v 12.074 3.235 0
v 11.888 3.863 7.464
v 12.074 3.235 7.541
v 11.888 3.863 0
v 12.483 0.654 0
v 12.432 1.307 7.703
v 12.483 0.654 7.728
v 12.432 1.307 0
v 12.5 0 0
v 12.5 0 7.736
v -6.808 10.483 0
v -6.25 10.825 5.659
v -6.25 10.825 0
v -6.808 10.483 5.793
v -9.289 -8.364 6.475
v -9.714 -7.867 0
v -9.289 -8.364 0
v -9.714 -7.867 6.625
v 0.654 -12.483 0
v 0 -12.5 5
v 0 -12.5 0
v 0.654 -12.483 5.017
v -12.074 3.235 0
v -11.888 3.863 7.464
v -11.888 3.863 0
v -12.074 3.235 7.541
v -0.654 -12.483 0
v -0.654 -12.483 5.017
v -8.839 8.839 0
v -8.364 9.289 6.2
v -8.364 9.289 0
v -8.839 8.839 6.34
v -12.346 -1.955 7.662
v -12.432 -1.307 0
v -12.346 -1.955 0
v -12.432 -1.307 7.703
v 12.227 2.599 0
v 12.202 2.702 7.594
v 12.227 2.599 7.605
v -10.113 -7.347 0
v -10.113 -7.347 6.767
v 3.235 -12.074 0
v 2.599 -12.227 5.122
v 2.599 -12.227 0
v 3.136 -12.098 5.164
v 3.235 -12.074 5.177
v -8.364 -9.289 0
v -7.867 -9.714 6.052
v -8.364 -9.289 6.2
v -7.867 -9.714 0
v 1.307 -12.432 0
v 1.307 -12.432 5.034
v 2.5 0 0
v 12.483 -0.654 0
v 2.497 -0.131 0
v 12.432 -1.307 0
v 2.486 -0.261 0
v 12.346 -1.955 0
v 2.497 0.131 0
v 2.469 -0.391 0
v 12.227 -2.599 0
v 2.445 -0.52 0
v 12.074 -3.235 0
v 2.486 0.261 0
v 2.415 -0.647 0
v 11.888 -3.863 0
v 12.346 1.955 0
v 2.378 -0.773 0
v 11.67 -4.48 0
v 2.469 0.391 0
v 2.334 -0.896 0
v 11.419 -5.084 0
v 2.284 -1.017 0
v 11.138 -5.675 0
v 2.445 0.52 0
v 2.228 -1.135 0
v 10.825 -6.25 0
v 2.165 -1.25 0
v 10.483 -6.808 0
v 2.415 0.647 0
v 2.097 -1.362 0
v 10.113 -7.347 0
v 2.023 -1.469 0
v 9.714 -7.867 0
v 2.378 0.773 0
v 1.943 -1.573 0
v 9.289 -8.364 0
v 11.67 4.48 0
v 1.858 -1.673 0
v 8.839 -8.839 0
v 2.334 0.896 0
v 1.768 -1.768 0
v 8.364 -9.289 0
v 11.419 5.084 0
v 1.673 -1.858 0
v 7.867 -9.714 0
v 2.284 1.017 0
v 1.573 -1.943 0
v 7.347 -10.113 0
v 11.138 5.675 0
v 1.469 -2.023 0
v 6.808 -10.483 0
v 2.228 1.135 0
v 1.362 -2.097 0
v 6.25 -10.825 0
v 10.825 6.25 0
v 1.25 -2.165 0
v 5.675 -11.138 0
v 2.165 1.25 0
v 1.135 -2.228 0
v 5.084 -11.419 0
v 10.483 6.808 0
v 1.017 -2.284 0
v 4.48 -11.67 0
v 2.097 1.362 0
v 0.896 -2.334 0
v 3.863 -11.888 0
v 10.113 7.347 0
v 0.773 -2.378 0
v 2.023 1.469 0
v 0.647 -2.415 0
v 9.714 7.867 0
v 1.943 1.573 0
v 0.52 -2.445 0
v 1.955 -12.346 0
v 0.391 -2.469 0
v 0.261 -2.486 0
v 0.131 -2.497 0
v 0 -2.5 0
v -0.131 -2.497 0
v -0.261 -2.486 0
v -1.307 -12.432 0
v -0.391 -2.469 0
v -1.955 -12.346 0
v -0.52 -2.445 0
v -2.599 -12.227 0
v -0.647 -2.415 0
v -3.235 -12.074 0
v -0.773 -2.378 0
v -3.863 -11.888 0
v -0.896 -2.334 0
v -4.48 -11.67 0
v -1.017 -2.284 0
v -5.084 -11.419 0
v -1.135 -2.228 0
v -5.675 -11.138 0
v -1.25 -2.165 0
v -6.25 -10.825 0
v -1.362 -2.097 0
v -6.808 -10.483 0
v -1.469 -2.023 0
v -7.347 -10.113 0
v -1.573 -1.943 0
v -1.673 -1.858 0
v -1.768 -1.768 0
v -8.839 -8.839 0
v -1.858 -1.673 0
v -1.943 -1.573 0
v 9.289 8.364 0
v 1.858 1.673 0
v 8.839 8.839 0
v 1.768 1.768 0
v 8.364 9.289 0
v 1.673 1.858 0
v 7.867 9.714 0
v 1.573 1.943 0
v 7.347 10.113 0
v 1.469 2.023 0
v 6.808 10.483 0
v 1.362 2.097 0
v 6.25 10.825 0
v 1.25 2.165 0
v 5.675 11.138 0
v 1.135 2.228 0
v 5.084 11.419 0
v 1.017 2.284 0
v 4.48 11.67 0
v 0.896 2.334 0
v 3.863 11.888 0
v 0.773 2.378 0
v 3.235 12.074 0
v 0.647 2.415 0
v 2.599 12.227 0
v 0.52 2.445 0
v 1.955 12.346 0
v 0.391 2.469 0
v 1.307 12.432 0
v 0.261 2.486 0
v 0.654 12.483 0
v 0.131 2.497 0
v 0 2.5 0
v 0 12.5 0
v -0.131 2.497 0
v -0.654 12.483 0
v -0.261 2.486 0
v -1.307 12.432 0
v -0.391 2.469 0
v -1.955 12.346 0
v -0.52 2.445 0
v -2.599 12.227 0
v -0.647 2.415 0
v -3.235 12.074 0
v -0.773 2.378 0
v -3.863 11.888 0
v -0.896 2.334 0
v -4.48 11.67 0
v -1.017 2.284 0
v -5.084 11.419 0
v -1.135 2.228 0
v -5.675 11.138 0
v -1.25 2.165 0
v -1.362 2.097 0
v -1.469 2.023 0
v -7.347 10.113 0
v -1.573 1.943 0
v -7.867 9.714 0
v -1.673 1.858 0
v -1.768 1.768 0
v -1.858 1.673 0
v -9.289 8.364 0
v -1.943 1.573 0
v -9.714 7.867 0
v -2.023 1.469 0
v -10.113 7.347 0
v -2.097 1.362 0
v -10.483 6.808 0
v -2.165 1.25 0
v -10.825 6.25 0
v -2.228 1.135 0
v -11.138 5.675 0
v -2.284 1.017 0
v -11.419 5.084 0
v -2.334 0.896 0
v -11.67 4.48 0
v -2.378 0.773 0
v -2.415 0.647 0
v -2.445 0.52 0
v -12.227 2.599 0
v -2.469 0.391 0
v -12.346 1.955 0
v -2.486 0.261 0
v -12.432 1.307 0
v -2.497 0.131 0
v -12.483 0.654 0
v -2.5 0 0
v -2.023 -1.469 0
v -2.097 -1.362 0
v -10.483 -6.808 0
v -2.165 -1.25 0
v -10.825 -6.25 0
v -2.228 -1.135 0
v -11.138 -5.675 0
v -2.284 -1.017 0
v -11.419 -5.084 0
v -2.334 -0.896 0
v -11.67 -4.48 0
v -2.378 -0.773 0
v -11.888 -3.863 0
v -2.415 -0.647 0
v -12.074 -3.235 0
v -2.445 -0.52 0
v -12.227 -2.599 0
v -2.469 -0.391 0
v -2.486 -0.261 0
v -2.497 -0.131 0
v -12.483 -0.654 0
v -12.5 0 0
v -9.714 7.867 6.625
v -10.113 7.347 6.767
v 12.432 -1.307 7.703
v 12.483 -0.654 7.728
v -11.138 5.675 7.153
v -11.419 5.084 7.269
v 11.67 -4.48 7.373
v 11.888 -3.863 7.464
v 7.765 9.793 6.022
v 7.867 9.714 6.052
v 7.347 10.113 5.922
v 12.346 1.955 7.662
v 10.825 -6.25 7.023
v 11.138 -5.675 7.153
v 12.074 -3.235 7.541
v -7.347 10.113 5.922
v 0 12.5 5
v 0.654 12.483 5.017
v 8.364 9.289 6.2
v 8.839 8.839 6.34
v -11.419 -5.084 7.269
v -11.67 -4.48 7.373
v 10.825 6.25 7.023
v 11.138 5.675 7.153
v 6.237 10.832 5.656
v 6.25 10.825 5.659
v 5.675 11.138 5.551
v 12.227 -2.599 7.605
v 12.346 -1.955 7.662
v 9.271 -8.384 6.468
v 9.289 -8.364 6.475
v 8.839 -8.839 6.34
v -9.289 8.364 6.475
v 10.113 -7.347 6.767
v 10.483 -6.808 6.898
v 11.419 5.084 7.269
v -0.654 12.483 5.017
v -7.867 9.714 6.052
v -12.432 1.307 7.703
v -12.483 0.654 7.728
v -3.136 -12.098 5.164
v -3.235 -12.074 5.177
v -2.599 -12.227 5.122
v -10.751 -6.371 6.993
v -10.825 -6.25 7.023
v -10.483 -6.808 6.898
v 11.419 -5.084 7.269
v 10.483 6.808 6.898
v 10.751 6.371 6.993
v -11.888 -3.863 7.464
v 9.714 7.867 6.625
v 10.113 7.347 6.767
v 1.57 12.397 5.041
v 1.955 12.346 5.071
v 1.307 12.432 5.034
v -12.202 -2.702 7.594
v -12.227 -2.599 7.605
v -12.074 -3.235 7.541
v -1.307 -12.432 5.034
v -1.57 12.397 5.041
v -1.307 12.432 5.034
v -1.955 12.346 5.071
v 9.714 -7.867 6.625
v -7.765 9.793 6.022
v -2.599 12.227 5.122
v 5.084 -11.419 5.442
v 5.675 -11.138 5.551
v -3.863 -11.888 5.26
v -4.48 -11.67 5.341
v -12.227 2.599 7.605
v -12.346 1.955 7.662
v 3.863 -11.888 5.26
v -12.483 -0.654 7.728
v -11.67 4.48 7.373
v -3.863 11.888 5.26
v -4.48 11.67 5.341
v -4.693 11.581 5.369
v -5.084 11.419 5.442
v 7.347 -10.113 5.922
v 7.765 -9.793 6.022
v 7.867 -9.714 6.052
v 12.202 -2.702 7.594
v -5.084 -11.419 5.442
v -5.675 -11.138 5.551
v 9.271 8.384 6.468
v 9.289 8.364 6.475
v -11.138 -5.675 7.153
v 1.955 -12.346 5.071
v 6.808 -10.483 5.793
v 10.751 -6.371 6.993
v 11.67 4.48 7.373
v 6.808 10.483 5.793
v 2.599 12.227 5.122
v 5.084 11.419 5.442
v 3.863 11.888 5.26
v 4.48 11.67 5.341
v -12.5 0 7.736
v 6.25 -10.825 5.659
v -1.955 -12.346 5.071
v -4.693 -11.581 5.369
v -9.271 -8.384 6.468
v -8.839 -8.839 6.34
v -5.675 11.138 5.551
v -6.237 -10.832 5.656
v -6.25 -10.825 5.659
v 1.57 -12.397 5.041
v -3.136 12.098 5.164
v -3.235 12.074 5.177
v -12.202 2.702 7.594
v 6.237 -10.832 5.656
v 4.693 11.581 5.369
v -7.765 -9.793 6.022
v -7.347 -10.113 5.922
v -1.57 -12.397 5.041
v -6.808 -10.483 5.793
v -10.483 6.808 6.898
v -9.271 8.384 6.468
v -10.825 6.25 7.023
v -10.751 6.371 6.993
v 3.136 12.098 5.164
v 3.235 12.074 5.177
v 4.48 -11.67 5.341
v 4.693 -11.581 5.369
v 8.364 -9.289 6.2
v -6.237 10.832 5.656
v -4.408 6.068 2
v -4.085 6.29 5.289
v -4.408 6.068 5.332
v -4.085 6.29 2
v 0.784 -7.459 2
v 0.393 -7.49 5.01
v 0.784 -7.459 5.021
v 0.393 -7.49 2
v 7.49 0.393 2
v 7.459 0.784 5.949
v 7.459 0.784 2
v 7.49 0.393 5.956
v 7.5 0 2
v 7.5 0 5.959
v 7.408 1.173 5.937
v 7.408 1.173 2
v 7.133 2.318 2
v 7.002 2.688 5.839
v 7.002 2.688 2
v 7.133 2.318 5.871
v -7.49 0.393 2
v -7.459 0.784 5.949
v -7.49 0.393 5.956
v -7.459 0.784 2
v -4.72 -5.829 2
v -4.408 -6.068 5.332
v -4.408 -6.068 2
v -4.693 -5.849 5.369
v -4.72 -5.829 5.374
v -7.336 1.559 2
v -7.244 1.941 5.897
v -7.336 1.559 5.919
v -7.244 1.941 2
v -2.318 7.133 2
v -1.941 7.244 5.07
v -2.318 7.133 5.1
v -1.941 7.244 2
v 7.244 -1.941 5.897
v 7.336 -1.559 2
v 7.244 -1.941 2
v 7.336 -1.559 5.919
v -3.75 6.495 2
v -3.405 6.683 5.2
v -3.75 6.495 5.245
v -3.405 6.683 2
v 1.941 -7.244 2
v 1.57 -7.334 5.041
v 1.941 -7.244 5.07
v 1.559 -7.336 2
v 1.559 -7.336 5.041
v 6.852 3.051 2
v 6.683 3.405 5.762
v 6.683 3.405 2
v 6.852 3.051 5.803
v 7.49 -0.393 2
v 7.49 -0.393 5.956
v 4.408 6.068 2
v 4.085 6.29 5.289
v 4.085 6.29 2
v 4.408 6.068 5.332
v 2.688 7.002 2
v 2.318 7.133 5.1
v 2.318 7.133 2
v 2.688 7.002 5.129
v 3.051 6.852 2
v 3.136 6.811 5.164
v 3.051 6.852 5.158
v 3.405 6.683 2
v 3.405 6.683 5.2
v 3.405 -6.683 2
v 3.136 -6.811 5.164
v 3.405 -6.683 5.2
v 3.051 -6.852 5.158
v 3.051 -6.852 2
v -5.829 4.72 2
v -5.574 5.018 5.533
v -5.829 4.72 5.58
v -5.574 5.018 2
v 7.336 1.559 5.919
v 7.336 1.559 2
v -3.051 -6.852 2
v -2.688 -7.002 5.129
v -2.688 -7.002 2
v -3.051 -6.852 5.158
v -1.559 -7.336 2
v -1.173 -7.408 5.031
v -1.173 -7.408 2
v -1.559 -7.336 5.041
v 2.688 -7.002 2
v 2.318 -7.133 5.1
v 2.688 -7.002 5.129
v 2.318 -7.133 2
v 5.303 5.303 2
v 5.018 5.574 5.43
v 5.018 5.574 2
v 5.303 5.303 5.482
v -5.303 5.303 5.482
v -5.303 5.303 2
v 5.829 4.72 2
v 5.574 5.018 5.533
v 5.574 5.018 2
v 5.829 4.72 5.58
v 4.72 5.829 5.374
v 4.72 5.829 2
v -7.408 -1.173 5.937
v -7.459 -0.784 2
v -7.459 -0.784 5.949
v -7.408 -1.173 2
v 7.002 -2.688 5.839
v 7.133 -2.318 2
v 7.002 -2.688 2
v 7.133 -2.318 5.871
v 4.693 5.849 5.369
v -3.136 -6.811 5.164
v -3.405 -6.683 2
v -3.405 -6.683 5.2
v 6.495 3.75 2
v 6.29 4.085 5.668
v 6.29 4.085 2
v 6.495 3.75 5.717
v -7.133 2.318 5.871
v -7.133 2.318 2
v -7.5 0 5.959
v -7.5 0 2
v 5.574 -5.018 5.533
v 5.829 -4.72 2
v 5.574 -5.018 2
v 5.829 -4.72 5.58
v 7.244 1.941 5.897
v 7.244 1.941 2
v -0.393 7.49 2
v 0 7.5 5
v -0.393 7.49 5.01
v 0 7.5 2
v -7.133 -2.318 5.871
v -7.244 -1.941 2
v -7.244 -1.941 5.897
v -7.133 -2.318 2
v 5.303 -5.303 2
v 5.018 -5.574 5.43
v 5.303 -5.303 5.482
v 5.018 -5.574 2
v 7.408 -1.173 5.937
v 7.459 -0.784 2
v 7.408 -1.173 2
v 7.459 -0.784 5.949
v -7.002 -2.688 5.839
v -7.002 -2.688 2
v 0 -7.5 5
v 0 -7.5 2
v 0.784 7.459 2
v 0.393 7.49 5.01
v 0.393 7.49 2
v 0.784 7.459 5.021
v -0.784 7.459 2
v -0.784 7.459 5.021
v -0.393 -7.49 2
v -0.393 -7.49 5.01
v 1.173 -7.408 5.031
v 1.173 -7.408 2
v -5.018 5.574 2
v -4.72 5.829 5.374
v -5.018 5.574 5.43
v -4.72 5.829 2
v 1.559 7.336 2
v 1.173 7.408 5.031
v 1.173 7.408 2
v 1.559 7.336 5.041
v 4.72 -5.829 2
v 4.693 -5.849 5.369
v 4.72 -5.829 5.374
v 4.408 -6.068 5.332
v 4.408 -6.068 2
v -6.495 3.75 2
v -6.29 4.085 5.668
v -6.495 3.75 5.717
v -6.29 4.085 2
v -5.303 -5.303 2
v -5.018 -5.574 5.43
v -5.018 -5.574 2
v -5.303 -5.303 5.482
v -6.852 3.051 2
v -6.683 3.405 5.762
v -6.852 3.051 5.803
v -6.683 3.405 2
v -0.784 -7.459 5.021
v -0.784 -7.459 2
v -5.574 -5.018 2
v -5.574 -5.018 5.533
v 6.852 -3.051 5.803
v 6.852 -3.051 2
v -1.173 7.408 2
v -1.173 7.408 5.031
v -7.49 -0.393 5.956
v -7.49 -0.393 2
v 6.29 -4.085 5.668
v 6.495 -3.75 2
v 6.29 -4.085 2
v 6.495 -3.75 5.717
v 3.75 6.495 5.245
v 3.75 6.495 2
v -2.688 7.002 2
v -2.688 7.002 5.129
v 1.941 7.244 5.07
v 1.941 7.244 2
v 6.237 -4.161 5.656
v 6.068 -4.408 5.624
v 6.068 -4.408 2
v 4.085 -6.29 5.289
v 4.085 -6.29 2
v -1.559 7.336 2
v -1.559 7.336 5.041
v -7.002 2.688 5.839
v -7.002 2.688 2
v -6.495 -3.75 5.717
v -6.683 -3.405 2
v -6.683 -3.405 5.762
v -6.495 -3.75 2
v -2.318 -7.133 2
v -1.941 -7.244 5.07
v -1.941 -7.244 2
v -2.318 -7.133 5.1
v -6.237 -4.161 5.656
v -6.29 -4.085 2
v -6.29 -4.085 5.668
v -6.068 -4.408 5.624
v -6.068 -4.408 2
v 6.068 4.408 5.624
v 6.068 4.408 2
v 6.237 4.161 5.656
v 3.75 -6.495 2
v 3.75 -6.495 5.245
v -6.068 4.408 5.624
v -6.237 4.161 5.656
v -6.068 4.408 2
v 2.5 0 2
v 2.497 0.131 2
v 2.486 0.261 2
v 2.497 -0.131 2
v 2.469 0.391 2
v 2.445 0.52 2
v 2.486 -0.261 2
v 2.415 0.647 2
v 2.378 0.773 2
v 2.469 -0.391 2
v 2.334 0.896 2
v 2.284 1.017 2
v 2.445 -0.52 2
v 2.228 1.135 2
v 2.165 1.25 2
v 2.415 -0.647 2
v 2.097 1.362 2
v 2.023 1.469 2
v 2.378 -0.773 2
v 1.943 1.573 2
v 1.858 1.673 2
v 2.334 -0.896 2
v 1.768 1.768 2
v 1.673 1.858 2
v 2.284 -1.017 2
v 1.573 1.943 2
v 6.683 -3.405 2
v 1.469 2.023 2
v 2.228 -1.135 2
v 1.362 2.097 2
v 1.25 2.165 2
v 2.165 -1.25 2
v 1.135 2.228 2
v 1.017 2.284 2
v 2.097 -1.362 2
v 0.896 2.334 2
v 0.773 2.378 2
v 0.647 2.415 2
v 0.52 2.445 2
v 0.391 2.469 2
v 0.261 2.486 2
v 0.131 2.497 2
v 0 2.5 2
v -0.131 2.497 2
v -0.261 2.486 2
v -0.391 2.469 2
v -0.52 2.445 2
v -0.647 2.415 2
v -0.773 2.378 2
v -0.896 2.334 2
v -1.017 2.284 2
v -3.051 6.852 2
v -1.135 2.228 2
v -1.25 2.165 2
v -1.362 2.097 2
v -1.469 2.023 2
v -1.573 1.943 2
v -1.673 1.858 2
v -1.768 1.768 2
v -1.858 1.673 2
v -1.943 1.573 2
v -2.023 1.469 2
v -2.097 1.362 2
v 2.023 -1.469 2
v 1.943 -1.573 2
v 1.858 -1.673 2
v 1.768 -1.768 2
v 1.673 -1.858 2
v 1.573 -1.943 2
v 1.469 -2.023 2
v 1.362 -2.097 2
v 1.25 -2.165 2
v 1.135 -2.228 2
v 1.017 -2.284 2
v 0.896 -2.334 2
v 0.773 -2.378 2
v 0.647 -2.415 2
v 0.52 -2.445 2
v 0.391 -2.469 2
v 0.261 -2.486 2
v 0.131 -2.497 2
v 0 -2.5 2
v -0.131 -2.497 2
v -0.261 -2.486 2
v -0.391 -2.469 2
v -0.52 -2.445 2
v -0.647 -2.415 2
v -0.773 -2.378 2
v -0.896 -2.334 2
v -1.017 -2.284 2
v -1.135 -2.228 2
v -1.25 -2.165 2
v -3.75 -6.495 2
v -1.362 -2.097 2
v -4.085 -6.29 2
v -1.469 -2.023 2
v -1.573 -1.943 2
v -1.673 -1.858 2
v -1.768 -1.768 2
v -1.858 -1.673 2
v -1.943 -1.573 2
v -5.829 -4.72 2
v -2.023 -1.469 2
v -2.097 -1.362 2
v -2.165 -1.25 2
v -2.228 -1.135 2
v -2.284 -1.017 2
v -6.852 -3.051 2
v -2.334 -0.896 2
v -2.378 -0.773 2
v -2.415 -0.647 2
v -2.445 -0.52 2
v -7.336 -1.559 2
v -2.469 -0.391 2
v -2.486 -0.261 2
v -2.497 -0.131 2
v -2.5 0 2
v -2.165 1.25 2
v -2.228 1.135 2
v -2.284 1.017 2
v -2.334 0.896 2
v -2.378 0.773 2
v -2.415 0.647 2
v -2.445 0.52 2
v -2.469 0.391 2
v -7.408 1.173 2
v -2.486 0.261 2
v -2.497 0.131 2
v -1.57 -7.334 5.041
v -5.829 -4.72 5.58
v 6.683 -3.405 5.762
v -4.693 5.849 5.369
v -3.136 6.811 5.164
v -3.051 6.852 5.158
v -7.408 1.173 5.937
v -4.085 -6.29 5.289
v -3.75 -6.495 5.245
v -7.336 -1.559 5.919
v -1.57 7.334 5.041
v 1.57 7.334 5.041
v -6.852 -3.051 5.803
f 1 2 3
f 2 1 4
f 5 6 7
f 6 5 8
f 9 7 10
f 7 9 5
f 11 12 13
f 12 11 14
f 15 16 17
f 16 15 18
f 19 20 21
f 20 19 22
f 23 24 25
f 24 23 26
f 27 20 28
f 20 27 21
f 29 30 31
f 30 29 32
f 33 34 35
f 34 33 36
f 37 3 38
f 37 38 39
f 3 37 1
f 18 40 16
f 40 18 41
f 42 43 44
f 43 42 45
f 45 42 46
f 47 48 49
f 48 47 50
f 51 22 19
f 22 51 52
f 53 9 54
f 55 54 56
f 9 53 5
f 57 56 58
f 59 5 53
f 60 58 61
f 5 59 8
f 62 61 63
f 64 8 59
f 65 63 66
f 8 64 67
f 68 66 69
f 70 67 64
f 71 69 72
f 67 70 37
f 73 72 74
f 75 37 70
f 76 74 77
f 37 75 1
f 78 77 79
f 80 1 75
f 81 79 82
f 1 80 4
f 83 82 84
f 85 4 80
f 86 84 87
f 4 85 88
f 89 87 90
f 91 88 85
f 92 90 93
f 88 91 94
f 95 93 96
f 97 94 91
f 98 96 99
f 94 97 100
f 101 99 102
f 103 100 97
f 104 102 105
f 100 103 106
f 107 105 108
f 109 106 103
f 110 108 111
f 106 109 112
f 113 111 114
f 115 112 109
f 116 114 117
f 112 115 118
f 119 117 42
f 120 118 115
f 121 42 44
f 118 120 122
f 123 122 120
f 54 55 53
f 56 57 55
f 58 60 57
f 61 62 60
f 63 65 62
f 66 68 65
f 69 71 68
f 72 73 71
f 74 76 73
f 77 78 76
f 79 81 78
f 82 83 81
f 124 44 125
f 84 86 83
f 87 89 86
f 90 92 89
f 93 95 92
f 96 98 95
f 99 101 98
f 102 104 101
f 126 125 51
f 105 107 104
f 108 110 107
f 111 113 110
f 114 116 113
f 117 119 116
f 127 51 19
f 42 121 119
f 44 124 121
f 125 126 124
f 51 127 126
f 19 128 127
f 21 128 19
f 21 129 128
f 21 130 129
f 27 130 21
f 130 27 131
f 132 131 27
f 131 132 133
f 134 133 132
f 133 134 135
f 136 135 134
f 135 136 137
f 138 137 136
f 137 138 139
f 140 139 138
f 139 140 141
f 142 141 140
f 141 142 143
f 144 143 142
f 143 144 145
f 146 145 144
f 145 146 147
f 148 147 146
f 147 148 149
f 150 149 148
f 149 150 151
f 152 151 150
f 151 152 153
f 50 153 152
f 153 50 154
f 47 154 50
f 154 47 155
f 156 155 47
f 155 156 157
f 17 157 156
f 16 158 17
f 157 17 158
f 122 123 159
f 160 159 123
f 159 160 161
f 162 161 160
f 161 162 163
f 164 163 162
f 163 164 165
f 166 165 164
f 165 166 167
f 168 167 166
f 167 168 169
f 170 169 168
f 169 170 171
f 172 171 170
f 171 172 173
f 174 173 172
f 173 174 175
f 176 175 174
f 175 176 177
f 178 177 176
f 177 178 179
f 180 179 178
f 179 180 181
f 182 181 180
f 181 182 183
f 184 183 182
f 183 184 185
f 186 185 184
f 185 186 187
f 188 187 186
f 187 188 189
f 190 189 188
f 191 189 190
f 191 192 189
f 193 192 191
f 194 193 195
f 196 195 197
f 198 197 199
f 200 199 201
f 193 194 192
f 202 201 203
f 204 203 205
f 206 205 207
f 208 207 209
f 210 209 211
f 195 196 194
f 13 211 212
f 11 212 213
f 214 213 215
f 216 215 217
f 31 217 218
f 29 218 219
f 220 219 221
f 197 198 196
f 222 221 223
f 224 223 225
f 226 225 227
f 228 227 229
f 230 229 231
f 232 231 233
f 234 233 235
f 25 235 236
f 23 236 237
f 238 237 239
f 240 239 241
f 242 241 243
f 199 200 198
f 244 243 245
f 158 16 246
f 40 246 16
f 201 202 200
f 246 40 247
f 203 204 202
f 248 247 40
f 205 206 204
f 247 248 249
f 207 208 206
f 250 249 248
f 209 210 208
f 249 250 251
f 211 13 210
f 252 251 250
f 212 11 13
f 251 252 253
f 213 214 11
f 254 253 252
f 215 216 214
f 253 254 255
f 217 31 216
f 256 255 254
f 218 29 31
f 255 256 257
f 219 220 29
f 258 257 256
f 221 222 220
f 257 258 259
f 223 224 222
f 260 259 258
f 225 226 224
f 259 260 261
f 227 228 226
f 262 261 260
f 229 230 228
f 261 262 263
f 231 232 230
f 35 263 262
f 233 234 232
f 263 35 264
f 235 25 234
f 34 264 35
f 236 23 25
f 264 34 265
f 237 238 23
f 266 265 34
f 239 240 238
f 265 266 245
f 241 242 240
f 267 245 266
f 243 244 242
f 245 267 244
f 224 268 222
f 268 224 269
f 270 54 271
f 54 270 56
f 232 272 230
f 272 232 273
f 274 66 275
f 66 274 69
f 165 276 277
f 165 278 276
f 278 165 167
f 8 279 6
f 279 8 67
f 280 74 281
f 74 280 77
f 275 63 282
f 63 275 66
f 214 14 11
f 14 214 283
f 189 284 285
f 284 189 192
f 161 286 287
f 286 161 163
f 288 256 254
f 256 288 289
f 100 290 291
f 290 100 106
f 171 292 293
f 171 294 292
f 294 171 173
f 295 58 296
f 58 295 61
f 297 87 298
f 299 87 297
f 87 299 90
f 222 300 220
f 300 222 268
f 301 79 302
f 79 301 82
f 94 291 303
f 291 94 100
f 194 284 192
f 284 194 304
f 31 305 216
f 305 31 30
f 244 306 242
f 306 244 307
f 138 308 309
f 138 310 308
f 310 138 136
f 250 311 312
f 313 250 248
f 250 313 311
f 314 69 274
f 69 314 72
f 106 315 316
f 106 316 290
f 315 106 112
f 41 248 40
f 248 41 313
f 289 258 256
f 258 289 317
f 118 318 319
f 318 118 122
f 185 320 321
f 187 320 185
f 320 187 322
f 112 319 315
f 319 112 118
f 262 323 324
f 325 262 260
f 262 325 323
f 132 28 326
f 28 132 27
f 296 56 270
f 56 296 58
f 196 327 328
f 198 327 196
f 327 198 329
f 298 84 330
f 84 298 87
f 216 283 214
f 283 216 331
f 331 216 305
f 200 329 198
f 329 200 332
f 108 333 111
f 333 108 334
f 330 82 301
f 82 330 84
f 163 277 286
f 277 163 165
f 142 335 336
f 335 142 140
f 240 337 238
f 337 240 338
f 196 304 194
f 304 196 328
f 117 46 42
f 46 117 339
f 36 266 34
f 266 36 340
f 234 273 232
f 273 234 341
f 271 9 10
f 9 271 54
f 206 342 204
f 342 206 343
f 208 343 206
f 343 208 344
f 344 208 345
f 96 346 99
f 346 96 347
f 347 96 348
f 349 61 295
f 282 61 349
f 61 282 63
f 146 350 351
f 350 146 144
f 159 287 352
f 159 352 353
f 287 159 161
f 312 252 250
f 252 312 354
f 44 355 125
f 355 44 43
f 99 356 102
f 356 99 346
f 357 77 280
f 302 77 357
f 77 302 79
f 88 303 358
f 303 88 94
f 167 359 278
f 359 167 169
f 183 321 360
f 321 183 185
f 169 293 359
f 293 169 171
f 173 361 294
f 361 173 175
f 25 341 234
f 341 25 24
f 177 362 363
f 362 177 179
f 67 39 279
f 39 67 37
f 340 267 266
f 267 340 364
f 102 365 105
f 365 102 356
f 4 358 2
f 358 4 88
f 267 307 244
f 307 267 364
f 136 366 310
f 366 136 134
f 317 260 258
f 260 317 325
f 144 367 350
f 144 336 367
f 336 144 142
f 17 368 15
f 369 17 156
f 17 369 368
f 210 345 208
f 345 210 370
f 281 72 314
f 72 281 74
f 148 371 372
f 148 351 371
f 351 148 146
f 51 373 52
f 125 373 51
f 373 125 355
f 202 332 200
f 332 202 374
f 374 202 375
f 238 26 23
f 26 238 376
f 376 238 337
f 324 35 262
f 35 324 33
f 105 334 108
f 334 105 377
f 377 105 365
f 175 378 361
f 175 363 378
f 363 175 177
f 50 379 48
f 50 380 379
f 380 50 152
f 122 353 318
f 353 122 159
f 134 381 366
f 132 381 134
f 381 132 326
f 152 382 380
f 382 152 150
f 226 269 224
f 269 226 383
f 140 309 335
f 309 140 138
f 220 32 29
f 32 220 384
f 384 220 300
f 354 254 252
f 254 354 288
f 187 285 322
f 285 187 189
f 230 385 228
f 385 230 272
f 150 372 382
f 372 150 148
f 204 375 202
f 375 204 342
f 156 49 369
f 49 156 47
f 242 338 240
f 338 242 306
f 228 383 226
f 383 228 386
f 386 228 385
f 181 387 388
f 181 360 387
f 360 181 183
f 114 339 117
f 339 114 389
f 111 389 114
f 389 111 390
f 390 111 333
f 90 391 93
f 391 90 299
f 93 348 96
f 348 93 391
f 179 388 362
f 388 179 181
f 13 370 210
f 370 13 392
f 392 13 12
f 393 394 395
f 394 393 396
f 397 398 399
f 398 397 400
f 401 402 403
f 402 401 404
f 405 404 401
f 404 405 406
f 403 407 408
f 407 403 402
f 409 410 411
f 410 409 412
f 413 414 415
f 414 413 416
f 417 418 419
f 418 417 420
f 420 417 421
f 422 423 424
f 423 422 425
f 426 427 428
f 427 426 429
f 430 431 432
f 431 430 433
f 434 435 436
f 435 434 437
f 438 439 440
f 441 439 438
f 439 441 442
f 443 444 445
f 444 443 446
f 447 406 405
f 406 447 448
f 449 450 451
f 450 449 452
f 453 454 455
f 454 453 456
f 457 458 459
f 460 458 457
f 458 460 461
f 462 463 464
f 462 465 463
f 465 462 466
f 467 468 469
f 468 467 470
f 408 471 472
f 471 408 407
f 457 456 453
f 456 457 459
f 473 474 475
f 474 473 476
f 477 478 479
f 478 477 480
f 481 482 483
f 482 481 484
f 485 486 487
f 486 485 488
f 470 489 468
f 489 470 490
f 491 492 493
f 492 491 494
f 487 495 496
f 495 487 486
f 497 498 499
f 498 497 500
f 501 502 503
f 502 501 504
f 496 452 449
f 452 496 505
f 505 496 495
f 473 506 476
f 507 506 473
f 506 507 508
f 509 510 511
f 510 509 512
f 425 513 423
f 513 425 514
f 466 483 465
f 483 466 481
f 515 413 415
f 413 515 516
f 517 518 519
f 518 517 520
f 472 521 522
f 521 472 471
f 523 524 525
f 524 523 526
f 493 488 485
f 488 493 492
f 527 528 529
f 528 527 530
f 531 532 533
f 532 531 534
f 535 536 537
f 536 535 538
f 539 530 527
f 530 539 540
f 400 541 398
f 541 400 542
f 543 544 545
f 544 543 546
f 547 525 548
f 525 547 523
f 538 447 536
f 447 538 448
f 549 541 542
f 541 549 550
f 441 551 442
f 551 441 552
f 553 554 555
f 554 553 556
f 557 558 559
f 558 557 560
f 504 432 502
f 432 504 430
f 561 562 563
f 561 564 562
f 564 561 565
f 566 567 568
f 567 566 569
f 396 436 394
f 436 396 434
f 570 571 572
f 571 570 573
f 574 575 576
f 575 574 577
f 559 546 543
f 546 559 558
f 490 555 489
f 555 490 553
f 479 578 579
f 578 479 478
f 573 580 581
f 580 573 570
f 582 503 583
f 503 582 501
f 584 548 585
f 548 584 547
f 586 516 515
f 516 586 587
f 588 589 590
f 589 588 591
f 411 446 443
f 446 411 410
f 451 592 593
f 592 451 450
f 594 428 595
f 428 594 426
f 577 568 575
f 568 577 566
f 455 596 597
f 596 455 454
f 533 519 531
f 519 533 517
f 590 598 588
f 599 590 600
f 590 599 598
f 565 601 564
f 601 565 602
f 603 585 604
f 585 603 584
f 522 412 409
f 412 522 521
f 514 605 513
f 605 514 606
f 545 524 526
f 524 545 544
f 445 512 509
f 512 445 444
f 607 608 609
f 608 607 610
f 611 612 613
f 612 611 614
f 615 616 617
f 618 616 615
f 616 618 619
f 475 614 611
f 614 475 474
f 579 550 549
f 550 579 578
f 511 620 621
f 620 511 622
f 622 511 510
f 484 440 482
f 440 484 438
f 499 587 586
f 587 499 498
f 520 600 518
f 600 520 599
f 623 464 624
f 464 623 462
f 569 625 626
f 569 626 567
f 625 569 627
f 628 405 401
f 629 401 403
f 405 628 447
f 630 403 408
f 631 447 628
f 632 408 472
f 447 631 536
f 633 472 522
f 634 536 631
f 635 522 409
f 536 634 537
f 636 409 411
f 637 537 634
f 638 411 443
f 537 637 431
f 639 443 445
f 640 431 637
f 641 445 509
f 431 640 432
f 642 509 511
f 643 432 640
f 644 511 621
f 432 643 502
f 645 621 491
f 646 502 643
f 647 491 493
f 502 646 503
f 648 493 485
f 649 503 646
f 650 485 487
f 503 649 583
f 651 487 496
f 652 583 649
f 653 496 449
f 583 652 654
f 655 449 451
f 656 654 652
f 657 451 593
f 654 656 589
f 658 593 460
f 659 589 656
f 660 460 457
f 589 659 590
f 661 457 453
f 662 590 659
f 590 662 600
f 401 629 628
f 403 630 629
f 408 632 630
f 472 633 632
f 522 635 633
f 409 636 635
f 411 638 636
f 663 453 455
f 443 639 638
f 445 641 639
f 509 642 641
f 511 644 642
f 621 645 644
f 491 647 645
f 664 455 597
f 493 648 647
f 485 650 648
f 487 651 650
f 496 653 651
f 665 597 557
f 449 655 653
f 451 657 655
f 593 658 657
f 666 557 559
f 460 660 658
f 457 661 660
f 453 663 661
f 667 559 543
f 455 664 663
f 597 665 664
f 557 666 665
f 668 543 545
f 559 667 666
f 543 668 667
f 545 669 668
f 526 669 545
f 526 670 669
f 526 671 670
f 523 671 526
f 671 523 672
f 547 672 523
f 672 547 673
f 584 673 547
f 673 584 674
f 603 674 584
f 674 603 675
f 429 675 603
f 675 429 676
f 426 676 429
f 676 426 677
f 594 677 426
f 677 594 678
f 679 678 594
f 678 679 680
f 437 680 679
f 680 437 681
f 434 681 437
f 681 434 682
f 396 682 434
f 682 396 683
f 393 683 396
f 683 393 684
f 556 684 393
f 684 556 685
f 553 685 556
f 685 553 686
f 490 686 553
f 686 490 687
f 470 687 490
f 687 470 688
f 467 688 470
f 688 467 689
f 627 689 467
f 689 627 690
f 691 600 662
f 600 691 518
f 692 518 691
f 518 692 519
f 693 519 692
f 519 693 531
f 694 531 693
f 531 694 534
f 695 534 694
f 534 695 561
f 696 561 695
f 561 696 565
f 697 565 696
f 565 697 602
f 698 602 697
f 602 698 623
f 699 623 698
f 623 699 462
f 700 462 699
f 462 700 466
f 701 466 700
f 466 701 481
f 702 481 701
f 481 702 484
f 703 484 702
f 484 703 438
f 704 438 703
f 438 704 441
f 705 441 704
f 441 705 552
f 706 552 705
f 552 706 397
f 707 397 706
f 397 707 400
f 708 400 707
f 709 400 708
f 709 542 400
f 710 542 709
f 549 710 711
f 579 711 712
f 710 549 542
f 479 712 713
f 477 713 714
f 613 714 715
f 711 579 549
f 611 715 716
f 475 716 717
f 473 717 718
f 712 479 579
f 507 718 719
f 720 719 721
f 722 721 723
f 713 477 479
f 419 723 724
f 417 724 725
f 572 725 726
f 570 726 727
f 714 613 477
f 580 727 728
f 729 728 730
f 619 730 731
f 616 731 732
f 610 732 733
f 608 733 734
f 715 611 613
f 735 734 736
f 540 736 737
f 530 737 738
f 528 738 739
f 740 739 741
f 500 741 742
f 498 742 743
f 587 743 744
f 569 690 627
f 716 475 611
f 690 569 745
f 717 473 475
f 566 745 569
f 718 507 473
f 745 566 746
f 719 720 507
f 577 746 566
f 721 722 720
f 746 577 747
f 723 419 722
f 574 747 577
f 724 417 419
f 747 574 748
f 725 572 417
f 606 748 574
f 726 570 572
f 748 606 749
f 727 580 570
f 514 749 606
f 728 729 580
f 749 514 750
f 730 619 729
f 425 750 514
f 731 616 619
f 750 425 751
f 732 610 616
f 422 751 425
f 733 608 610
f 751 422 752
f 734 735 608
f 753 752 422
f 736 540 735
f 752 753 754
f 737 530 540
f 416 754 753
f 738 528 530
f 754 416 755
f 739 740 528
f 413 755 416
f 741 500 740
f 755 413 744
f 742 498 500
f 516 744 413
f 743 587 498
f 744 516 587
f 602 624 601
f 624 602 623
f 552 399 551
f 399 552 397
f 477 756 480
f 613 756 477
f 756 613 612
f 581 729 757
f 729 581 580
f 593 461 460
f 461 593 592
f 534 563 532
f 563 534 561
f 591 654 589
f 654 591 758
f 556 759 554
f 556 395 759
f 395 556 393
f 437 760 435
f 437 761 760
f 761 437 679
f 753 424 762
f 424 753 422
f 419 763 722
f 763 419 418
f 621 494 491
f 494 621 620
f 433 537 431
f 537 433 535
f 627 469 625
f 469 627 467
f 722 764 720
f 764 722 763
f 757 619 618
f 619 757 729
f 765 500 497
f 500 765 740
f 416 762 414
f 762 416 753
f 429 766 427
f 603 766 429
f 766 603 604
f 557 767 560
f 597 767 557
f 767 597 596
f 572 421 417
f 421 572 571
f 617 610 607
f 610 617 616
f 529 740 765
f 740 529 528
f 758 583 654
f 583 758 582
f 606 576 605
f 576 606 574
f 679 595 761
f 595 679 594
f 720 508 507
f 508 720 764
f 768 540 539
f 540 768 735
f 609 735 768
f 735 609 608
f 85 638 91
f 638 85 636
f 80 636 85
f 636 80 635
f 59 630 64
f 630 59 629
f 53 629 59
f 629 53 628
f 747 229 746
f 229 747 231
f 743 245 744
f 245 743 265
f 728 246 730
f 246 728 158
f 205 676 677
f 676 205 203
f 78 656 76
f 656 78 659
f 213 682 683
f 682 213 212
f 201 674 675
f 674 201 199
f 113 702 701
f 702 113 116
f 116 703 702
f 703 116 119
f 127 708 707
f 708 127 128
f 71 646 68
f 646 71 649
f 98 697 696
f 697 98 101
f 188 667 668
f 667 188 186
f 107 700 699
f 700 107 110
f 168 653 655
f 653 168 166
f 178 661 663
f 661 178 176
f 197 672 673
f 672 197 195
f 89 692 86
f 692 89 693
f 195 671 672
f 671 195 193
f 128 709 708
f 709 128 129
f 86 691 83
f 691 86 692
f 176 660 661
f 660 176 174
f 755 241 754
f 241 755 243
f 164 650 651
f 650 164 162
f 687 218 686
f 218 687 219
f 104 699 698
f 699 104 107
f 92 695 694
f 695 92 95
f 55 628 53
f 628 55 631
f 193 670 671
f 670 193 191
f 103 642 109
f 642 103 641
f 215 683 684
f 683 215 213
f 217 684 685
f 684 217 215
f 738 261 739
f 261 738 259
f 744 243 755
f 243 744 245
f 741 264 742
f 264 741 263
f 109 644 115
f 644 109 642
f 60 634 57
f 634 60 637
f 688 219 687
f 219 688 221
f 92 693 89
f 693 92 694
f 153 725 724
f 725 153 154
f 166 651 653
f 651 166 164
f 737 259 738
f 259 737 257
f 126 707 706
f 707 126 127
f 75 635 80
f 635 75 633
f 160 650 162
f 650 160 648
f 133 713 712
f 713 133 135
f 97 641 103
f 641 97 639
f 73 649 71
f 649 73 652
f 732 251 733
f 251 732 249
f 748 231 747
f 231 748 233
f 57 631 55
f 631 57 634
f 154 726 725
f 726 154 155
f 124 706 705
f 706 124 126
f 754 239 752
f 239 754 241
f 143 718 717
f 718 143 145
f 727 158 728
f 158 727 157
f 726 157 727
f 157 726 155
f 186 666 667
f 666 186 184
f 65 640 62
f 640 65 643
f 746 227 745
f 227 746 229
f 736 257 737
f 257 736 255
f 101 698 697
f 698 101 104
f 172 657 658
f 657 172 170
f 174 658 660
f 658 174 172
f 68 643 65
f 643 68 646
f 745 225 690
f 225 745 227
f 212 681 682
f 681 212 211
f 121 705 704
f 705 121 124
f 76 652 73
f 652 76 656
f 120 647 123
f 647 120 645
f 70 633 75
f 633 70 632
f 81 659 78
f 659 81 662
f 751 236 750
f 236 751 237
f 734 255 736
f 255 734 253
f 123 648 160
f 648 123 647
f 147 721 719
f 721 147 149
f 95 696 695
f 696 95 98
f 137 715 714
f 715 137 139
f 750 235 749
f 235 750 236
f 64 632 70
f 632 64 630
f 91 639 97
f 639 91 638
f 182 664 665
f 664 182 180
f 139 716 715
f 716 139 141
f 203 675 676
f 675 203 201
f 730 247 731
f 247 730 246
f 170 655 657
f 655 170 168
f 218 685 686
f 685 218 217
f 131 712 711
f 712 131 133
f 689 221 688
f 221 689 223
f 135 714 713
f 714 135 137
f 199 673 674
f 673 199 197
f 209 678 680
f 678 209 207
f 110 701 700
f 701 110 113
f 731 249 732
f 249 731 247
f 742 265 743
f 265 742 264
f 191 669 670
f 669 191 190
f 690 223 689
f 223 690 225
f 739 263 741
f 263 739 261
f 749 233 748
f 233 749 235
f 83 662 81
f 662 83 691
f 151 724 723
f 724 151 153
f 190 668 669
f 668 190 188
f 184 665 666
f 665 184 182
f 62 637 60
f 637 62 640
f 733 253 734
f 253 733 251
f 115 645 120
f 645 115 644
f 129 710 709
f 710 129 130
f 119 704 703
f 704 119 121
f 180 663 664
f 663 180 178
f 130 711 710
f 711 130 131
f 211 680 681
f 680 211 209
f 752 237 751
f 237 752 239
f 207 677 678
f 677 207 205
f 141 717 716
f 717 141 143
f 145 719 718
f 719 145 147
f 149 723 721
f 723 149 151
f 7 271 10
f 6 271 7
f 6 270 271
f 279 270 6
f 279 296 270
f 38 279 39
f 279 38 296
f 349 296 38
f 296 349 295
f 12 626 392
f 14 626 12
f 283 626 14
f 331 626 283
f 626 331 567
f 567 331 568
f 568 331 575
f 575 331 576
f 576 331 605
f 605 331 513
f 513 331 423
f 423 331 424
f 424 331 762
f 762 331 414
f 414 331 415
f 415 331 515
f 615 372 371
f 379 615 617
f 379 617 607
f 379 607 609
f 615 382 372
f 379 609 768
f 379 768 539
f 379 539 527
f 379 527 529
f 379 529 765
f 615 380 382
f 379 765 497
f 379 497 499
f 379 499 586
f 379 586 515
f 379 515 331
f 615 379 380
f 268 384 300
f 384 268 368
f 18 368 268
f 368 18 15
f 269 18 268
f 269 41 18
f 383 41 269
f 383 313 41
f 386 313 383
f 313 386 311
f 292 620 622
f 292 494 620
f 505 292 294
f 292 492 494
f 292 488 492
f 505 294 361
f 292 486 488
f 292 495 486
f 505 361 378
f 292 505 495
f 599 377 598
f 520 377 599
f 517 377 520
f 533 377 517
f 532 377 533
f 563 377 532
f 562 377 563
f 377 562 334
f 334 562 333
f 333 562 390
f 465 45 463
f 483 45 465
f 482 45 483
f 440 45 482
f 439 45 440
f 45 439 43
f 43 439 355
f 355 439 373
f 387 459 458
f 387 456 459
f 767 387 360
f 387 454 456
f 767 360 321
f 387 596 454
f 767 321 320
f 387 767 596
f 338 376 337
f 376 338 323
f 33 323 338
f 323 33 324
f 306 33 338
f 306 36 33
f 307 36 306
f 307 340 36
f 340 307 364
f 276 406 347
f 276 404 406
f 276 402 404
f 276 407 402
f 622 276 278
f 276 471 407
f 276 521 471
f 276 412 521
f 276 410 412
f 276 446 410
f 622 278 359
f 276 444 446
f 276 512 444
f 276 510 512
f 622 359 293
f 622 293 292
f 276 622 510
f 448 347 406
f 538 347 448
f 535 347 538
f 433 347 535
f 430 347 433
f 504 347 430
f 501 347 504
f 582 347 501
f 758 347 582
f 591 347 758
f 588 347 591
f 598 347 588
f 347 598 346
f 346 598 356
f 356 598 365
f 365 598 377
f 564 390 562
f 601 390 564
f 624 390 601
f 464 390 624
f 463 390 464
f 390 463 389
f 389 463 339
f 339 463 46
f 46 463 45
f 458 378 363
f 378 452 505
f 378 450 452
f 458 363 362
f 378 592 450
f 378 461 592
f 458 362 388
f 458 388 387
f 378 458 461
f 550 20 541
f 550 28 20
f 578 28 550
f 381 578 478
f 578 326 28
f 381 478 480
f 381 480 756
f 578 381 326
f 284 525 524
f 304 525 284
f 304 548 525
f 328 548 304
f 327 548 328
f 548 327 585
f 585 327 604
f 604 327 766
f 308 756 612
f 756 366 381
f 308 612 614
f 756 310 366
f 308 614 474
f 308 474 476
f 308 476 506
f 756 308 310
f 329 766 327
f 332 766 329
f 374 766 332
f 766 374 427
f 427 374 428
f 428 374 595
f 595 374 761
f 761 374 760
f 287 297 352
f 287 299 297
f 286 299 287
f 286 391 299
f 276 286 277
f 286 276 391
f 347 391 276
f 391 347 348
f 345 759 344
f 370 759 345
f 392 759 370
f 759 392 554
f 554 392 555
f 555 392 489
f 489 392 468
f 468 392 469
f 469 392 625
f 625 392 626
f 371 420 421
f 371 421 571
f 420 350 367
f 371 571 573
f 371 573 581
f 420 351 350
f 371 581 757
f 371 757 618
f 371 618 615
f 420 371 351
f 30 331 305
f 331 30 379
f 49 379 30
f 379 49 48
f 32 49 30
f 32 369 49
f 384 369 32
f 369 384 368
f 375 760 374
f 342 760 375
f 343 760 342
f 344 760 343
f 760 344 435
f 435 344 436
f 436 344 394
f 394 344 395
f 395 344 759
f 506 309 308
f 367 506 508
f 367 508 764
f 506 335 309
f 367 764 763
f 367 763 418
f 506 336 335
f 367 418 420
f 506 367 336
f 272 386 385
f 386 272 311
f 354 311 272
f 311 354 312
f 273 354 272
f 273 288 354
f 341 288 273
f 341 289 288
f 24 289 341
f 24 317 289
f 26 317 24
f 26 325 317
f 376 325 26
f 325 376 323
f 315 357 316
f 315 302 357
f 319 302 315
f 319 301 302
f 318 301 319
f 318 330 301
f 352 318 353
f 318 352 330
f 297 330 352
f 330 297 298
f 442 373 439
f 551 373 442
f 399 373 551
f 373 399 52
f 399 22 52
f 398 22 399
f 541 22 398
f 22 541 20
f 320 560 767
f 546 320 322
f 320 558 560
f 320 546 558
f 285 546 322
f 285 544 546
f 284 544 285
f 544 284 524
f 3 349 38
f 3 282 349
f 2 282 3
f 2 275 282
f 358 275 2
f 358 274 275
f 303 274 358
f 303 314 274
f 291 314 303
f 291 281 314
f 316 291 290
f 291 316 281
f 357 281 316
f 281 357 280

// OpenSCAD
Height=8;
OuterDiameter=25;
InnerDiameter=15;
HoleDiameter=5;
BottomThickness=2;
PoleDiameter=60;
TopZOffset=5;
$fn=120;

difference(){
    cylinder(r=OuterDiameter/2,h=Height);
    translate([0,0,BottomThickness])cylinder(r=InnerDiameter/2,h=Height);
    translate([0,0,-0.01])cylinder(r=HoleDiameter/2,h=Height);
    translate([0,OuterDiameter,PoleDiameter/2+TopZOffset])rotate([90,0,0])cylinder(r=PoleDiameter/2,h=OuterDiameter*2);
}
